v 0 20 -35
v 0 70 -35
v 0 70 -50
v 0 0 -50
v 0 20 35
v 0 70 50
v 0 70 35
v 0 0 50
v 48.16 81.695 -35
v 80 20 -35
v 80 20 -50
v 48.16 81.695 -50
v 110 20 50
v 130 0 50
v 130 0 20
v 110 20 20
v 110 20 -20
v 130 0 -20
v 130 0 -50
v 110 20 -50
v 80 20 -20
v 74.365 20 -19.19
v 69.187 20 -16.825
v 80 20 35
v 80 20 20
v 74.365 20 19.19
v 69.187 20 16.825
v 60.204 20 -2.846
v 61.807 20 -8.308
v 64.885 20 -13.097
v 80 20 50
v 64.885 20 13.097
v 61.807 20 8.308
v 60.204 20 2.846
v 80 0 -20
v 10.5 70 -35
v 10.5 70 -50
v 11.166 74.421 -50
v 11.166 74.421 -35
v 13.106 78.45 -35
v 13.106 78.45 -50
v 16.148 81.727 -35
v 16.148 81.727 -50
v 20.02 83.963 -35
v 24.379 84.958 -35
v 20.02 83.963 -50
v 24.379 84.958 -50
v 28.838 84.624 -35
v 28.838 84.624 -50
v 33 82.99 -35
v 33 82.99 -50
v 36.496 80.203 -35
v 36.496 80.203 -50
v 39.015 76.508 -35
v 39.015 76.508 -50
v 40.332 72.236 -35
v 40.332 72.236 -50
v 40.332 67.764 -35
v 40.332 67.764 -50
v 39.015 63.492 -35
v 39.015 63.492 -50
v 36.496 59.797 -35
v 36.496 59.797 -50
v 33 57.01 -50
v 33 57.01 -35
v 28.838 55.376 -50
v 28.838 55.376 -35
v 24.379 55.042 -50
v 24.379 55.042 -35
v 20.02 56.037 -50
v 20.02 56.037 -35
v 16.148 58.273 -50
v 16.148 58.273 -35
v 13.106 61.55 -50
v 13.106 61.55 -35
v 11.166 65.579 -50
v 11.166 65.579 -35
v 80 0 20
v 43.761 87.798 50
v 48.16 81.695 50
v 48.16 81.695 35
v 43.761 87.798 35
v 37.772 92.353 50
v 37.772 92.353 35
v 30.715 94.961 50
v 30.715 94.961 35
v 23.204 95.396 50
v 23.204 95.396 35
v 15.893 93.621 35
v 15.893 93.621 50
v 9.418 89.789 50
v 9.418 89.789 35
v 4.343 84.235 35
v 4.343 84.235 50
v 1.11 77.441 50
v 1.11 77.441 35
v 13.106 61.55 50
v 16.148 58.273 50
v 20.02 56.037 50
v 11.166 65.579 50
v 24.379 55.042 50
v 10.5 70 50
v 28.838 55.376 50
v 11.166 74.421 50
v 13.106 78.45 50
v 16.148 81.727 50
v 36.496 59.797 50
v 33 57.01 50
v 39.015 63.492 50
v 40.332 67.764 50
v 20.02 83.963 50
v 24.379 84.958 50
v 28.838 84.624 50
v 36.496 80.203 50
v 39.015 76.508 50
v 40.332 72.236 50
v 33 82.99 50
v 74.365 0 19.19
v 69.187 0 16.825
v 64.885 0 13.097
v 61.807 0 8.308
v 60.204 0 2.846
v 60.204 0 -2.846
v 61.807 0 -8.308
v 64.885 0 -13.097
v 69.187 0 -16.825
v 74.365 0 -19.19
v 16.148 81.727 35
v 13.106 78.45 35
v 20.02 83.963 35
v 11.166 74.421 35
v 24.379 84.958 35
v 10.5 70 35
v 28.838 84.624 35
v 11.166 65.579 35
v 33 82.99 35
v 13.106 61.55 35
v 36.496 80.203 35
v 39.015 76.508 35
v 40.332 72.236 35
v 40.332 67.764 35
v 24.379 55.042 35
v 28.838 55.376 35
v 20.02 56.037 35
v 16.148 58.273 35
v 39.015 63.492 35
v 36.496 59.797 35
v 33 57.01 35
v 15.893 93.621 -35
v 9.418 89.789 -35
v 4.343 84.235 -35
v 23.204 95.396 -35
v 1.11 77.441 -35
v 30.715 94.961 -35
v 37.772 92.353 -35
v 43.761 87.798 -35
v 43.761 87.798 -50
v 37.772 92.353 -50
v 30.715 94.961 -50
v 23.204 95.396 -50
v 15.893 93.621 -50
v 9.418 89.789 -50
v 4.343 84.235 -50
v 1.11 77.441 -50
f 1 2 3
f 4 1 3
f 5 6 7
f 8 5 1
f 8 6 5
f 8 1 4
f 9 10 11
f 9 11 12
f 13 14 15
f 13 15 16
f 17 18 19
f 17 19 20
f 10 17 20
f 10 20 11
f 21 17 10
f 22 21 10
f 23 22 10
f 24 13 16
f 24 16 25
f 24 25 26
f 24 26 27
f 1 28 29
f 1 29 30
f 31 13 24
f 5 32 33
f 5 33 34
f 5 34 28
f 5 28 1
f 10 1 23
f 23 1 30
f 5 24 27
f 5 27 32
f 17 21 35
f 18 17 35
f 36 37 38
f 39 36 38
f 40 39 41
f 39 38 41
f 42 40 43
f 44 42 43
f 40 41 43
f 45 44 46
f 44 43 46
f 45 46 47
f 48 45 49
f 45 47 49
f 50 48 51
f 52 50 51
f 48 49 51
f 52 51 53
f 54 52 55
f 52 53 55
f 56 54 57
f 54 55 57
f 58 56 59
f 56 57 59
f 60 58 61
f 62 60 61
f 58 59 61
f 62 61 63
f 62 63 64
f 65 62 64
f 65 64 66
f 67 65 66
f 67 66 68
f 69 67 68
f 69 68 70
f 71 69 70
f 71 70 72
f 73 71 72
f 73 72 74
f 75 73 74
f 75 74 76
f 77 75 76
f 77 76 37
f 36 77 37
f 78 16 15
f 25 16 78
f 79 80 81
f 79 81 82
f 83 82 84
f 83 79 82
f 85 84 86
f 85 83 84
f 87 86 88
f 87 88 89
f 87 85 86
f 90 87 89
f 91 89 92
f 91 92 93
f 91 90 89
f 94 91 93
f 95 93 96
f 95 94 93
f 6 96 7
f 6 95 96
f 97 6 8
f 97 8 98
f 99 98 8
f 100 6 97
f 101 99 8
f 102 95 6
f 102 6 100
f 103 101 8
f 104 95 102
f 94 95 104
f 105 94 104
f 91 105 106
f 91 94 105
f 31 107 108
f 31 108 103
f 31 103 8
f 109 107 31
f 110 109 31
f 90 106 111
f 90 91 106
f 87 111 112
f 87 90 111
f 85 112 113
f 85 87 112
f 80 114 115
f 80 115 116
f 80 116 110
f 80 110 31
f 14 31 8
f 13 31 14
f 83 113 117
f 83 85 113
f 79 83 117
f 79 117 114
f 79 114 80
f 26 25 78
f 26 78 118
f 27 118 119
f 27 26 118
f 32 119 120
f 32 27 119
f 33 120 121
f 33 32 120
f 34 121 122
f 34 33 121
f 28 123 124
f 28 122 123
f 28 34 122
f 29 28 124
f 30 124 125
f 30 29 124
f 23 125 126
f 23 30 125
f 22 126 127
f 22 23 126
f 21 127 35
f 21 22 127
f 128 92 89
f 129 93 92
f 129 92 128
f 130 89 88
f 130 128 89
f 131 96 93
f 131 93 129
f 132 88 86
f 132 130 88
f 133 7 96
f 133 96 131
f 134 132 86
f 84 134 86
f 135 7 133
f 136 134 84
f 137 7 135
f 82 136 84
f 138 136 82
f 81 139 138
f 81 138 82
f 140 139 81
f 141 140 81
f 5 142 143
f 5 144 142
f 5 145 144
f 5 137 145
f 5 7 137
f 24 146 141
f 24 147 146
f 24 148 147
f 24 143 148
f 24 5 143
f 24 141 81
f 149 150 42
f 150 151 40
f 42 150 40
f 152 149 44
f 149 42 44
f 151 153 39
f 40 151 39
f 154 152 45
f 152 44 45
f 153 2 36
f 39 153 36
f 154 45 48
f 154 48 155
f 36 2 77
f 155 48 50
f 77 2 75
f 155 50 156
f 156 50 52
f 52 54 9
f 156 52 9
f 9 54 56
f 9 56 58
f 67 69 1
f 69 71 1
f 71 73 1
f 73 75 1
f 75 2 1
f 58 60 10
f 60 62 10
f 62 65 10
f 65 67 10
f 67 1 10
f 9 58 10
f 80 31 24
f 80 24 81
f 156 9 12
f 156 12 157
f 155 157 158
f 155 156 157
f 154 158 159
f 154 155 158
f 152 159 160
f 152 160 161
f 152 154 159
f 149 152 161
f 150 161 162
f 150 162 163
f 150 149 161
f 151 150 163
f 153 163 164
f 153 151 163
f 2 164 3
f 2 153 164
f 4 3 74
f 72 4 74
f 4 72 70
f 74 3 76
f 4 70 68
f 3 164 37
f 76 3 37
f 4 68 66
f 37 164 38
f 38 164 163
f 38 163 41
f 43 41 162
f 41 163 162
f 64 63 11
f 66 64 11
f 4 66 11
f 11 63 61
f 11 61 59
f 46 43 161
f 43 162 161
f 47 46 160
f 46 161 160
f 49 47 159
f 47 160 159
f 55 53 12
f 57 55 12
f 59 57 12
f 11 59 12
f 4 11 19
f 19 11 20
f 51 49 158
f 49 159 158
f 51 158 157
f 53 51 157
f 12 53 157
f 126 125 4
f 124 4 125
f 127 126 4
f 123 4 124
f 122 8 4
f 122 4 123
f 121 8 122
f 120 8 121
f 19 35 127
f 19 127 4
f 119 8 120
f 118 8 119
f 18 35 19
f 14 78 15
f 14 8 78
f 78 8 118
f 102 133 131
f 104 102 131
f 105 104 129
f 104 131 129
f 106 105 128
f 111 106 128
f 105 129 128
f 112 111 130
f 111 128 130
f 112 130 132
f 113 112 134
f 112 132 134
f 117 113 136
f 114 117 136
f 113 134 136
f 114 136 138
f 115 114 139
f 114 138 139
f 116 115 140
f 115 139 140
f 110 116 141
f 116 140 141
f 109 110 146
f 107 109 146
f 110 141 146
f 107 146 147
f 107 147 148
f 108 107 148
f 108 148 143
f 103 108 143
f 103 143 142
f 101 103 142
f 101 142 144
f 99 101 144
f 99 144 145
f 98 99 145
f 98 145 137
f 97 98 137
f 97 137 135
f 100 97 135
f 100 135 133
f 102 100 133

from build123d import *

# Parameters (mm, degrees)
BOSS_EXTRUDE1_DEPTH    = 50
SKETCH2_W              = 171.937170065
SKETCH2_H              = 70
CUT_EXTRUDE1_DEPTH     = 159.430584169
CUT_EXTRUDE2_DEPTH     = 159.430584169
F_20_0MM_DOWEL_HOLE1_D = 30


with BuildPart() as part:
    # Sketch1 → Boss-Extrude1 (new, symmetric)
    with BuildSketch(Plane.XY):
        with BuildLine():
            Line((0, 0), (130, 0))
            Line((130, 0), (110, 20))
            Line((110, 20), (80, 20))
            Line((80, 20), (48.160217592, 81.694637176))
            ThreePointArc((48.160217592, 81.694637176), (19.482755972, 94.779886487), (0, 70))
            Line((0, 70), (0, 0))
        make_face()
    extrude(amount=BOSS_EXTRUDE1_DEPTH, both=True)

    # Sketch2 → Cut-Extrude1 (cut, through all)
    with BuildSketch(Plane(origin=(0, 20, 0), x_dir=(1, 0, 0), z_dir=(0, 1, 0))):
        with Locations((69.738425947, 0)):
            Rectangle(SKETCH2_W, SKETCH2_H)
    extrude(amount=CUT_EXTRUDE1_DEPTH, mode=Mode.SUBTRACT)

    # Sketch3 → Cut-Extrude2 (cut, through all)
    with BuildSketch(Plane(origin=(0, 20, 0), x_dir=(1, 0, 0), z_dir=(0, 1, 0))):
        with BuildLine():
            Line((80, 20), (153.648677571, 20))
            Line((153.648677571, 20), (153.648677571, -20))
            Line((153.648677571, -20), (80, -20))
            ThreePointArc((80, -20), (60, 0), (80, 20))
        make_face()
    extrude(amount=-CUT_EXTRUDE2_DEPTH, mode=Mode.SUBTRACT)

    # Ø20.0mm Dowel Hole1 (through all)
    with Locations(Plane.XY.offset(50)):
        with Locations((25.5, 70)):
            Hole(F_20_0MM_DOWEL_HOLE1_D / 2)


solid = part.part
